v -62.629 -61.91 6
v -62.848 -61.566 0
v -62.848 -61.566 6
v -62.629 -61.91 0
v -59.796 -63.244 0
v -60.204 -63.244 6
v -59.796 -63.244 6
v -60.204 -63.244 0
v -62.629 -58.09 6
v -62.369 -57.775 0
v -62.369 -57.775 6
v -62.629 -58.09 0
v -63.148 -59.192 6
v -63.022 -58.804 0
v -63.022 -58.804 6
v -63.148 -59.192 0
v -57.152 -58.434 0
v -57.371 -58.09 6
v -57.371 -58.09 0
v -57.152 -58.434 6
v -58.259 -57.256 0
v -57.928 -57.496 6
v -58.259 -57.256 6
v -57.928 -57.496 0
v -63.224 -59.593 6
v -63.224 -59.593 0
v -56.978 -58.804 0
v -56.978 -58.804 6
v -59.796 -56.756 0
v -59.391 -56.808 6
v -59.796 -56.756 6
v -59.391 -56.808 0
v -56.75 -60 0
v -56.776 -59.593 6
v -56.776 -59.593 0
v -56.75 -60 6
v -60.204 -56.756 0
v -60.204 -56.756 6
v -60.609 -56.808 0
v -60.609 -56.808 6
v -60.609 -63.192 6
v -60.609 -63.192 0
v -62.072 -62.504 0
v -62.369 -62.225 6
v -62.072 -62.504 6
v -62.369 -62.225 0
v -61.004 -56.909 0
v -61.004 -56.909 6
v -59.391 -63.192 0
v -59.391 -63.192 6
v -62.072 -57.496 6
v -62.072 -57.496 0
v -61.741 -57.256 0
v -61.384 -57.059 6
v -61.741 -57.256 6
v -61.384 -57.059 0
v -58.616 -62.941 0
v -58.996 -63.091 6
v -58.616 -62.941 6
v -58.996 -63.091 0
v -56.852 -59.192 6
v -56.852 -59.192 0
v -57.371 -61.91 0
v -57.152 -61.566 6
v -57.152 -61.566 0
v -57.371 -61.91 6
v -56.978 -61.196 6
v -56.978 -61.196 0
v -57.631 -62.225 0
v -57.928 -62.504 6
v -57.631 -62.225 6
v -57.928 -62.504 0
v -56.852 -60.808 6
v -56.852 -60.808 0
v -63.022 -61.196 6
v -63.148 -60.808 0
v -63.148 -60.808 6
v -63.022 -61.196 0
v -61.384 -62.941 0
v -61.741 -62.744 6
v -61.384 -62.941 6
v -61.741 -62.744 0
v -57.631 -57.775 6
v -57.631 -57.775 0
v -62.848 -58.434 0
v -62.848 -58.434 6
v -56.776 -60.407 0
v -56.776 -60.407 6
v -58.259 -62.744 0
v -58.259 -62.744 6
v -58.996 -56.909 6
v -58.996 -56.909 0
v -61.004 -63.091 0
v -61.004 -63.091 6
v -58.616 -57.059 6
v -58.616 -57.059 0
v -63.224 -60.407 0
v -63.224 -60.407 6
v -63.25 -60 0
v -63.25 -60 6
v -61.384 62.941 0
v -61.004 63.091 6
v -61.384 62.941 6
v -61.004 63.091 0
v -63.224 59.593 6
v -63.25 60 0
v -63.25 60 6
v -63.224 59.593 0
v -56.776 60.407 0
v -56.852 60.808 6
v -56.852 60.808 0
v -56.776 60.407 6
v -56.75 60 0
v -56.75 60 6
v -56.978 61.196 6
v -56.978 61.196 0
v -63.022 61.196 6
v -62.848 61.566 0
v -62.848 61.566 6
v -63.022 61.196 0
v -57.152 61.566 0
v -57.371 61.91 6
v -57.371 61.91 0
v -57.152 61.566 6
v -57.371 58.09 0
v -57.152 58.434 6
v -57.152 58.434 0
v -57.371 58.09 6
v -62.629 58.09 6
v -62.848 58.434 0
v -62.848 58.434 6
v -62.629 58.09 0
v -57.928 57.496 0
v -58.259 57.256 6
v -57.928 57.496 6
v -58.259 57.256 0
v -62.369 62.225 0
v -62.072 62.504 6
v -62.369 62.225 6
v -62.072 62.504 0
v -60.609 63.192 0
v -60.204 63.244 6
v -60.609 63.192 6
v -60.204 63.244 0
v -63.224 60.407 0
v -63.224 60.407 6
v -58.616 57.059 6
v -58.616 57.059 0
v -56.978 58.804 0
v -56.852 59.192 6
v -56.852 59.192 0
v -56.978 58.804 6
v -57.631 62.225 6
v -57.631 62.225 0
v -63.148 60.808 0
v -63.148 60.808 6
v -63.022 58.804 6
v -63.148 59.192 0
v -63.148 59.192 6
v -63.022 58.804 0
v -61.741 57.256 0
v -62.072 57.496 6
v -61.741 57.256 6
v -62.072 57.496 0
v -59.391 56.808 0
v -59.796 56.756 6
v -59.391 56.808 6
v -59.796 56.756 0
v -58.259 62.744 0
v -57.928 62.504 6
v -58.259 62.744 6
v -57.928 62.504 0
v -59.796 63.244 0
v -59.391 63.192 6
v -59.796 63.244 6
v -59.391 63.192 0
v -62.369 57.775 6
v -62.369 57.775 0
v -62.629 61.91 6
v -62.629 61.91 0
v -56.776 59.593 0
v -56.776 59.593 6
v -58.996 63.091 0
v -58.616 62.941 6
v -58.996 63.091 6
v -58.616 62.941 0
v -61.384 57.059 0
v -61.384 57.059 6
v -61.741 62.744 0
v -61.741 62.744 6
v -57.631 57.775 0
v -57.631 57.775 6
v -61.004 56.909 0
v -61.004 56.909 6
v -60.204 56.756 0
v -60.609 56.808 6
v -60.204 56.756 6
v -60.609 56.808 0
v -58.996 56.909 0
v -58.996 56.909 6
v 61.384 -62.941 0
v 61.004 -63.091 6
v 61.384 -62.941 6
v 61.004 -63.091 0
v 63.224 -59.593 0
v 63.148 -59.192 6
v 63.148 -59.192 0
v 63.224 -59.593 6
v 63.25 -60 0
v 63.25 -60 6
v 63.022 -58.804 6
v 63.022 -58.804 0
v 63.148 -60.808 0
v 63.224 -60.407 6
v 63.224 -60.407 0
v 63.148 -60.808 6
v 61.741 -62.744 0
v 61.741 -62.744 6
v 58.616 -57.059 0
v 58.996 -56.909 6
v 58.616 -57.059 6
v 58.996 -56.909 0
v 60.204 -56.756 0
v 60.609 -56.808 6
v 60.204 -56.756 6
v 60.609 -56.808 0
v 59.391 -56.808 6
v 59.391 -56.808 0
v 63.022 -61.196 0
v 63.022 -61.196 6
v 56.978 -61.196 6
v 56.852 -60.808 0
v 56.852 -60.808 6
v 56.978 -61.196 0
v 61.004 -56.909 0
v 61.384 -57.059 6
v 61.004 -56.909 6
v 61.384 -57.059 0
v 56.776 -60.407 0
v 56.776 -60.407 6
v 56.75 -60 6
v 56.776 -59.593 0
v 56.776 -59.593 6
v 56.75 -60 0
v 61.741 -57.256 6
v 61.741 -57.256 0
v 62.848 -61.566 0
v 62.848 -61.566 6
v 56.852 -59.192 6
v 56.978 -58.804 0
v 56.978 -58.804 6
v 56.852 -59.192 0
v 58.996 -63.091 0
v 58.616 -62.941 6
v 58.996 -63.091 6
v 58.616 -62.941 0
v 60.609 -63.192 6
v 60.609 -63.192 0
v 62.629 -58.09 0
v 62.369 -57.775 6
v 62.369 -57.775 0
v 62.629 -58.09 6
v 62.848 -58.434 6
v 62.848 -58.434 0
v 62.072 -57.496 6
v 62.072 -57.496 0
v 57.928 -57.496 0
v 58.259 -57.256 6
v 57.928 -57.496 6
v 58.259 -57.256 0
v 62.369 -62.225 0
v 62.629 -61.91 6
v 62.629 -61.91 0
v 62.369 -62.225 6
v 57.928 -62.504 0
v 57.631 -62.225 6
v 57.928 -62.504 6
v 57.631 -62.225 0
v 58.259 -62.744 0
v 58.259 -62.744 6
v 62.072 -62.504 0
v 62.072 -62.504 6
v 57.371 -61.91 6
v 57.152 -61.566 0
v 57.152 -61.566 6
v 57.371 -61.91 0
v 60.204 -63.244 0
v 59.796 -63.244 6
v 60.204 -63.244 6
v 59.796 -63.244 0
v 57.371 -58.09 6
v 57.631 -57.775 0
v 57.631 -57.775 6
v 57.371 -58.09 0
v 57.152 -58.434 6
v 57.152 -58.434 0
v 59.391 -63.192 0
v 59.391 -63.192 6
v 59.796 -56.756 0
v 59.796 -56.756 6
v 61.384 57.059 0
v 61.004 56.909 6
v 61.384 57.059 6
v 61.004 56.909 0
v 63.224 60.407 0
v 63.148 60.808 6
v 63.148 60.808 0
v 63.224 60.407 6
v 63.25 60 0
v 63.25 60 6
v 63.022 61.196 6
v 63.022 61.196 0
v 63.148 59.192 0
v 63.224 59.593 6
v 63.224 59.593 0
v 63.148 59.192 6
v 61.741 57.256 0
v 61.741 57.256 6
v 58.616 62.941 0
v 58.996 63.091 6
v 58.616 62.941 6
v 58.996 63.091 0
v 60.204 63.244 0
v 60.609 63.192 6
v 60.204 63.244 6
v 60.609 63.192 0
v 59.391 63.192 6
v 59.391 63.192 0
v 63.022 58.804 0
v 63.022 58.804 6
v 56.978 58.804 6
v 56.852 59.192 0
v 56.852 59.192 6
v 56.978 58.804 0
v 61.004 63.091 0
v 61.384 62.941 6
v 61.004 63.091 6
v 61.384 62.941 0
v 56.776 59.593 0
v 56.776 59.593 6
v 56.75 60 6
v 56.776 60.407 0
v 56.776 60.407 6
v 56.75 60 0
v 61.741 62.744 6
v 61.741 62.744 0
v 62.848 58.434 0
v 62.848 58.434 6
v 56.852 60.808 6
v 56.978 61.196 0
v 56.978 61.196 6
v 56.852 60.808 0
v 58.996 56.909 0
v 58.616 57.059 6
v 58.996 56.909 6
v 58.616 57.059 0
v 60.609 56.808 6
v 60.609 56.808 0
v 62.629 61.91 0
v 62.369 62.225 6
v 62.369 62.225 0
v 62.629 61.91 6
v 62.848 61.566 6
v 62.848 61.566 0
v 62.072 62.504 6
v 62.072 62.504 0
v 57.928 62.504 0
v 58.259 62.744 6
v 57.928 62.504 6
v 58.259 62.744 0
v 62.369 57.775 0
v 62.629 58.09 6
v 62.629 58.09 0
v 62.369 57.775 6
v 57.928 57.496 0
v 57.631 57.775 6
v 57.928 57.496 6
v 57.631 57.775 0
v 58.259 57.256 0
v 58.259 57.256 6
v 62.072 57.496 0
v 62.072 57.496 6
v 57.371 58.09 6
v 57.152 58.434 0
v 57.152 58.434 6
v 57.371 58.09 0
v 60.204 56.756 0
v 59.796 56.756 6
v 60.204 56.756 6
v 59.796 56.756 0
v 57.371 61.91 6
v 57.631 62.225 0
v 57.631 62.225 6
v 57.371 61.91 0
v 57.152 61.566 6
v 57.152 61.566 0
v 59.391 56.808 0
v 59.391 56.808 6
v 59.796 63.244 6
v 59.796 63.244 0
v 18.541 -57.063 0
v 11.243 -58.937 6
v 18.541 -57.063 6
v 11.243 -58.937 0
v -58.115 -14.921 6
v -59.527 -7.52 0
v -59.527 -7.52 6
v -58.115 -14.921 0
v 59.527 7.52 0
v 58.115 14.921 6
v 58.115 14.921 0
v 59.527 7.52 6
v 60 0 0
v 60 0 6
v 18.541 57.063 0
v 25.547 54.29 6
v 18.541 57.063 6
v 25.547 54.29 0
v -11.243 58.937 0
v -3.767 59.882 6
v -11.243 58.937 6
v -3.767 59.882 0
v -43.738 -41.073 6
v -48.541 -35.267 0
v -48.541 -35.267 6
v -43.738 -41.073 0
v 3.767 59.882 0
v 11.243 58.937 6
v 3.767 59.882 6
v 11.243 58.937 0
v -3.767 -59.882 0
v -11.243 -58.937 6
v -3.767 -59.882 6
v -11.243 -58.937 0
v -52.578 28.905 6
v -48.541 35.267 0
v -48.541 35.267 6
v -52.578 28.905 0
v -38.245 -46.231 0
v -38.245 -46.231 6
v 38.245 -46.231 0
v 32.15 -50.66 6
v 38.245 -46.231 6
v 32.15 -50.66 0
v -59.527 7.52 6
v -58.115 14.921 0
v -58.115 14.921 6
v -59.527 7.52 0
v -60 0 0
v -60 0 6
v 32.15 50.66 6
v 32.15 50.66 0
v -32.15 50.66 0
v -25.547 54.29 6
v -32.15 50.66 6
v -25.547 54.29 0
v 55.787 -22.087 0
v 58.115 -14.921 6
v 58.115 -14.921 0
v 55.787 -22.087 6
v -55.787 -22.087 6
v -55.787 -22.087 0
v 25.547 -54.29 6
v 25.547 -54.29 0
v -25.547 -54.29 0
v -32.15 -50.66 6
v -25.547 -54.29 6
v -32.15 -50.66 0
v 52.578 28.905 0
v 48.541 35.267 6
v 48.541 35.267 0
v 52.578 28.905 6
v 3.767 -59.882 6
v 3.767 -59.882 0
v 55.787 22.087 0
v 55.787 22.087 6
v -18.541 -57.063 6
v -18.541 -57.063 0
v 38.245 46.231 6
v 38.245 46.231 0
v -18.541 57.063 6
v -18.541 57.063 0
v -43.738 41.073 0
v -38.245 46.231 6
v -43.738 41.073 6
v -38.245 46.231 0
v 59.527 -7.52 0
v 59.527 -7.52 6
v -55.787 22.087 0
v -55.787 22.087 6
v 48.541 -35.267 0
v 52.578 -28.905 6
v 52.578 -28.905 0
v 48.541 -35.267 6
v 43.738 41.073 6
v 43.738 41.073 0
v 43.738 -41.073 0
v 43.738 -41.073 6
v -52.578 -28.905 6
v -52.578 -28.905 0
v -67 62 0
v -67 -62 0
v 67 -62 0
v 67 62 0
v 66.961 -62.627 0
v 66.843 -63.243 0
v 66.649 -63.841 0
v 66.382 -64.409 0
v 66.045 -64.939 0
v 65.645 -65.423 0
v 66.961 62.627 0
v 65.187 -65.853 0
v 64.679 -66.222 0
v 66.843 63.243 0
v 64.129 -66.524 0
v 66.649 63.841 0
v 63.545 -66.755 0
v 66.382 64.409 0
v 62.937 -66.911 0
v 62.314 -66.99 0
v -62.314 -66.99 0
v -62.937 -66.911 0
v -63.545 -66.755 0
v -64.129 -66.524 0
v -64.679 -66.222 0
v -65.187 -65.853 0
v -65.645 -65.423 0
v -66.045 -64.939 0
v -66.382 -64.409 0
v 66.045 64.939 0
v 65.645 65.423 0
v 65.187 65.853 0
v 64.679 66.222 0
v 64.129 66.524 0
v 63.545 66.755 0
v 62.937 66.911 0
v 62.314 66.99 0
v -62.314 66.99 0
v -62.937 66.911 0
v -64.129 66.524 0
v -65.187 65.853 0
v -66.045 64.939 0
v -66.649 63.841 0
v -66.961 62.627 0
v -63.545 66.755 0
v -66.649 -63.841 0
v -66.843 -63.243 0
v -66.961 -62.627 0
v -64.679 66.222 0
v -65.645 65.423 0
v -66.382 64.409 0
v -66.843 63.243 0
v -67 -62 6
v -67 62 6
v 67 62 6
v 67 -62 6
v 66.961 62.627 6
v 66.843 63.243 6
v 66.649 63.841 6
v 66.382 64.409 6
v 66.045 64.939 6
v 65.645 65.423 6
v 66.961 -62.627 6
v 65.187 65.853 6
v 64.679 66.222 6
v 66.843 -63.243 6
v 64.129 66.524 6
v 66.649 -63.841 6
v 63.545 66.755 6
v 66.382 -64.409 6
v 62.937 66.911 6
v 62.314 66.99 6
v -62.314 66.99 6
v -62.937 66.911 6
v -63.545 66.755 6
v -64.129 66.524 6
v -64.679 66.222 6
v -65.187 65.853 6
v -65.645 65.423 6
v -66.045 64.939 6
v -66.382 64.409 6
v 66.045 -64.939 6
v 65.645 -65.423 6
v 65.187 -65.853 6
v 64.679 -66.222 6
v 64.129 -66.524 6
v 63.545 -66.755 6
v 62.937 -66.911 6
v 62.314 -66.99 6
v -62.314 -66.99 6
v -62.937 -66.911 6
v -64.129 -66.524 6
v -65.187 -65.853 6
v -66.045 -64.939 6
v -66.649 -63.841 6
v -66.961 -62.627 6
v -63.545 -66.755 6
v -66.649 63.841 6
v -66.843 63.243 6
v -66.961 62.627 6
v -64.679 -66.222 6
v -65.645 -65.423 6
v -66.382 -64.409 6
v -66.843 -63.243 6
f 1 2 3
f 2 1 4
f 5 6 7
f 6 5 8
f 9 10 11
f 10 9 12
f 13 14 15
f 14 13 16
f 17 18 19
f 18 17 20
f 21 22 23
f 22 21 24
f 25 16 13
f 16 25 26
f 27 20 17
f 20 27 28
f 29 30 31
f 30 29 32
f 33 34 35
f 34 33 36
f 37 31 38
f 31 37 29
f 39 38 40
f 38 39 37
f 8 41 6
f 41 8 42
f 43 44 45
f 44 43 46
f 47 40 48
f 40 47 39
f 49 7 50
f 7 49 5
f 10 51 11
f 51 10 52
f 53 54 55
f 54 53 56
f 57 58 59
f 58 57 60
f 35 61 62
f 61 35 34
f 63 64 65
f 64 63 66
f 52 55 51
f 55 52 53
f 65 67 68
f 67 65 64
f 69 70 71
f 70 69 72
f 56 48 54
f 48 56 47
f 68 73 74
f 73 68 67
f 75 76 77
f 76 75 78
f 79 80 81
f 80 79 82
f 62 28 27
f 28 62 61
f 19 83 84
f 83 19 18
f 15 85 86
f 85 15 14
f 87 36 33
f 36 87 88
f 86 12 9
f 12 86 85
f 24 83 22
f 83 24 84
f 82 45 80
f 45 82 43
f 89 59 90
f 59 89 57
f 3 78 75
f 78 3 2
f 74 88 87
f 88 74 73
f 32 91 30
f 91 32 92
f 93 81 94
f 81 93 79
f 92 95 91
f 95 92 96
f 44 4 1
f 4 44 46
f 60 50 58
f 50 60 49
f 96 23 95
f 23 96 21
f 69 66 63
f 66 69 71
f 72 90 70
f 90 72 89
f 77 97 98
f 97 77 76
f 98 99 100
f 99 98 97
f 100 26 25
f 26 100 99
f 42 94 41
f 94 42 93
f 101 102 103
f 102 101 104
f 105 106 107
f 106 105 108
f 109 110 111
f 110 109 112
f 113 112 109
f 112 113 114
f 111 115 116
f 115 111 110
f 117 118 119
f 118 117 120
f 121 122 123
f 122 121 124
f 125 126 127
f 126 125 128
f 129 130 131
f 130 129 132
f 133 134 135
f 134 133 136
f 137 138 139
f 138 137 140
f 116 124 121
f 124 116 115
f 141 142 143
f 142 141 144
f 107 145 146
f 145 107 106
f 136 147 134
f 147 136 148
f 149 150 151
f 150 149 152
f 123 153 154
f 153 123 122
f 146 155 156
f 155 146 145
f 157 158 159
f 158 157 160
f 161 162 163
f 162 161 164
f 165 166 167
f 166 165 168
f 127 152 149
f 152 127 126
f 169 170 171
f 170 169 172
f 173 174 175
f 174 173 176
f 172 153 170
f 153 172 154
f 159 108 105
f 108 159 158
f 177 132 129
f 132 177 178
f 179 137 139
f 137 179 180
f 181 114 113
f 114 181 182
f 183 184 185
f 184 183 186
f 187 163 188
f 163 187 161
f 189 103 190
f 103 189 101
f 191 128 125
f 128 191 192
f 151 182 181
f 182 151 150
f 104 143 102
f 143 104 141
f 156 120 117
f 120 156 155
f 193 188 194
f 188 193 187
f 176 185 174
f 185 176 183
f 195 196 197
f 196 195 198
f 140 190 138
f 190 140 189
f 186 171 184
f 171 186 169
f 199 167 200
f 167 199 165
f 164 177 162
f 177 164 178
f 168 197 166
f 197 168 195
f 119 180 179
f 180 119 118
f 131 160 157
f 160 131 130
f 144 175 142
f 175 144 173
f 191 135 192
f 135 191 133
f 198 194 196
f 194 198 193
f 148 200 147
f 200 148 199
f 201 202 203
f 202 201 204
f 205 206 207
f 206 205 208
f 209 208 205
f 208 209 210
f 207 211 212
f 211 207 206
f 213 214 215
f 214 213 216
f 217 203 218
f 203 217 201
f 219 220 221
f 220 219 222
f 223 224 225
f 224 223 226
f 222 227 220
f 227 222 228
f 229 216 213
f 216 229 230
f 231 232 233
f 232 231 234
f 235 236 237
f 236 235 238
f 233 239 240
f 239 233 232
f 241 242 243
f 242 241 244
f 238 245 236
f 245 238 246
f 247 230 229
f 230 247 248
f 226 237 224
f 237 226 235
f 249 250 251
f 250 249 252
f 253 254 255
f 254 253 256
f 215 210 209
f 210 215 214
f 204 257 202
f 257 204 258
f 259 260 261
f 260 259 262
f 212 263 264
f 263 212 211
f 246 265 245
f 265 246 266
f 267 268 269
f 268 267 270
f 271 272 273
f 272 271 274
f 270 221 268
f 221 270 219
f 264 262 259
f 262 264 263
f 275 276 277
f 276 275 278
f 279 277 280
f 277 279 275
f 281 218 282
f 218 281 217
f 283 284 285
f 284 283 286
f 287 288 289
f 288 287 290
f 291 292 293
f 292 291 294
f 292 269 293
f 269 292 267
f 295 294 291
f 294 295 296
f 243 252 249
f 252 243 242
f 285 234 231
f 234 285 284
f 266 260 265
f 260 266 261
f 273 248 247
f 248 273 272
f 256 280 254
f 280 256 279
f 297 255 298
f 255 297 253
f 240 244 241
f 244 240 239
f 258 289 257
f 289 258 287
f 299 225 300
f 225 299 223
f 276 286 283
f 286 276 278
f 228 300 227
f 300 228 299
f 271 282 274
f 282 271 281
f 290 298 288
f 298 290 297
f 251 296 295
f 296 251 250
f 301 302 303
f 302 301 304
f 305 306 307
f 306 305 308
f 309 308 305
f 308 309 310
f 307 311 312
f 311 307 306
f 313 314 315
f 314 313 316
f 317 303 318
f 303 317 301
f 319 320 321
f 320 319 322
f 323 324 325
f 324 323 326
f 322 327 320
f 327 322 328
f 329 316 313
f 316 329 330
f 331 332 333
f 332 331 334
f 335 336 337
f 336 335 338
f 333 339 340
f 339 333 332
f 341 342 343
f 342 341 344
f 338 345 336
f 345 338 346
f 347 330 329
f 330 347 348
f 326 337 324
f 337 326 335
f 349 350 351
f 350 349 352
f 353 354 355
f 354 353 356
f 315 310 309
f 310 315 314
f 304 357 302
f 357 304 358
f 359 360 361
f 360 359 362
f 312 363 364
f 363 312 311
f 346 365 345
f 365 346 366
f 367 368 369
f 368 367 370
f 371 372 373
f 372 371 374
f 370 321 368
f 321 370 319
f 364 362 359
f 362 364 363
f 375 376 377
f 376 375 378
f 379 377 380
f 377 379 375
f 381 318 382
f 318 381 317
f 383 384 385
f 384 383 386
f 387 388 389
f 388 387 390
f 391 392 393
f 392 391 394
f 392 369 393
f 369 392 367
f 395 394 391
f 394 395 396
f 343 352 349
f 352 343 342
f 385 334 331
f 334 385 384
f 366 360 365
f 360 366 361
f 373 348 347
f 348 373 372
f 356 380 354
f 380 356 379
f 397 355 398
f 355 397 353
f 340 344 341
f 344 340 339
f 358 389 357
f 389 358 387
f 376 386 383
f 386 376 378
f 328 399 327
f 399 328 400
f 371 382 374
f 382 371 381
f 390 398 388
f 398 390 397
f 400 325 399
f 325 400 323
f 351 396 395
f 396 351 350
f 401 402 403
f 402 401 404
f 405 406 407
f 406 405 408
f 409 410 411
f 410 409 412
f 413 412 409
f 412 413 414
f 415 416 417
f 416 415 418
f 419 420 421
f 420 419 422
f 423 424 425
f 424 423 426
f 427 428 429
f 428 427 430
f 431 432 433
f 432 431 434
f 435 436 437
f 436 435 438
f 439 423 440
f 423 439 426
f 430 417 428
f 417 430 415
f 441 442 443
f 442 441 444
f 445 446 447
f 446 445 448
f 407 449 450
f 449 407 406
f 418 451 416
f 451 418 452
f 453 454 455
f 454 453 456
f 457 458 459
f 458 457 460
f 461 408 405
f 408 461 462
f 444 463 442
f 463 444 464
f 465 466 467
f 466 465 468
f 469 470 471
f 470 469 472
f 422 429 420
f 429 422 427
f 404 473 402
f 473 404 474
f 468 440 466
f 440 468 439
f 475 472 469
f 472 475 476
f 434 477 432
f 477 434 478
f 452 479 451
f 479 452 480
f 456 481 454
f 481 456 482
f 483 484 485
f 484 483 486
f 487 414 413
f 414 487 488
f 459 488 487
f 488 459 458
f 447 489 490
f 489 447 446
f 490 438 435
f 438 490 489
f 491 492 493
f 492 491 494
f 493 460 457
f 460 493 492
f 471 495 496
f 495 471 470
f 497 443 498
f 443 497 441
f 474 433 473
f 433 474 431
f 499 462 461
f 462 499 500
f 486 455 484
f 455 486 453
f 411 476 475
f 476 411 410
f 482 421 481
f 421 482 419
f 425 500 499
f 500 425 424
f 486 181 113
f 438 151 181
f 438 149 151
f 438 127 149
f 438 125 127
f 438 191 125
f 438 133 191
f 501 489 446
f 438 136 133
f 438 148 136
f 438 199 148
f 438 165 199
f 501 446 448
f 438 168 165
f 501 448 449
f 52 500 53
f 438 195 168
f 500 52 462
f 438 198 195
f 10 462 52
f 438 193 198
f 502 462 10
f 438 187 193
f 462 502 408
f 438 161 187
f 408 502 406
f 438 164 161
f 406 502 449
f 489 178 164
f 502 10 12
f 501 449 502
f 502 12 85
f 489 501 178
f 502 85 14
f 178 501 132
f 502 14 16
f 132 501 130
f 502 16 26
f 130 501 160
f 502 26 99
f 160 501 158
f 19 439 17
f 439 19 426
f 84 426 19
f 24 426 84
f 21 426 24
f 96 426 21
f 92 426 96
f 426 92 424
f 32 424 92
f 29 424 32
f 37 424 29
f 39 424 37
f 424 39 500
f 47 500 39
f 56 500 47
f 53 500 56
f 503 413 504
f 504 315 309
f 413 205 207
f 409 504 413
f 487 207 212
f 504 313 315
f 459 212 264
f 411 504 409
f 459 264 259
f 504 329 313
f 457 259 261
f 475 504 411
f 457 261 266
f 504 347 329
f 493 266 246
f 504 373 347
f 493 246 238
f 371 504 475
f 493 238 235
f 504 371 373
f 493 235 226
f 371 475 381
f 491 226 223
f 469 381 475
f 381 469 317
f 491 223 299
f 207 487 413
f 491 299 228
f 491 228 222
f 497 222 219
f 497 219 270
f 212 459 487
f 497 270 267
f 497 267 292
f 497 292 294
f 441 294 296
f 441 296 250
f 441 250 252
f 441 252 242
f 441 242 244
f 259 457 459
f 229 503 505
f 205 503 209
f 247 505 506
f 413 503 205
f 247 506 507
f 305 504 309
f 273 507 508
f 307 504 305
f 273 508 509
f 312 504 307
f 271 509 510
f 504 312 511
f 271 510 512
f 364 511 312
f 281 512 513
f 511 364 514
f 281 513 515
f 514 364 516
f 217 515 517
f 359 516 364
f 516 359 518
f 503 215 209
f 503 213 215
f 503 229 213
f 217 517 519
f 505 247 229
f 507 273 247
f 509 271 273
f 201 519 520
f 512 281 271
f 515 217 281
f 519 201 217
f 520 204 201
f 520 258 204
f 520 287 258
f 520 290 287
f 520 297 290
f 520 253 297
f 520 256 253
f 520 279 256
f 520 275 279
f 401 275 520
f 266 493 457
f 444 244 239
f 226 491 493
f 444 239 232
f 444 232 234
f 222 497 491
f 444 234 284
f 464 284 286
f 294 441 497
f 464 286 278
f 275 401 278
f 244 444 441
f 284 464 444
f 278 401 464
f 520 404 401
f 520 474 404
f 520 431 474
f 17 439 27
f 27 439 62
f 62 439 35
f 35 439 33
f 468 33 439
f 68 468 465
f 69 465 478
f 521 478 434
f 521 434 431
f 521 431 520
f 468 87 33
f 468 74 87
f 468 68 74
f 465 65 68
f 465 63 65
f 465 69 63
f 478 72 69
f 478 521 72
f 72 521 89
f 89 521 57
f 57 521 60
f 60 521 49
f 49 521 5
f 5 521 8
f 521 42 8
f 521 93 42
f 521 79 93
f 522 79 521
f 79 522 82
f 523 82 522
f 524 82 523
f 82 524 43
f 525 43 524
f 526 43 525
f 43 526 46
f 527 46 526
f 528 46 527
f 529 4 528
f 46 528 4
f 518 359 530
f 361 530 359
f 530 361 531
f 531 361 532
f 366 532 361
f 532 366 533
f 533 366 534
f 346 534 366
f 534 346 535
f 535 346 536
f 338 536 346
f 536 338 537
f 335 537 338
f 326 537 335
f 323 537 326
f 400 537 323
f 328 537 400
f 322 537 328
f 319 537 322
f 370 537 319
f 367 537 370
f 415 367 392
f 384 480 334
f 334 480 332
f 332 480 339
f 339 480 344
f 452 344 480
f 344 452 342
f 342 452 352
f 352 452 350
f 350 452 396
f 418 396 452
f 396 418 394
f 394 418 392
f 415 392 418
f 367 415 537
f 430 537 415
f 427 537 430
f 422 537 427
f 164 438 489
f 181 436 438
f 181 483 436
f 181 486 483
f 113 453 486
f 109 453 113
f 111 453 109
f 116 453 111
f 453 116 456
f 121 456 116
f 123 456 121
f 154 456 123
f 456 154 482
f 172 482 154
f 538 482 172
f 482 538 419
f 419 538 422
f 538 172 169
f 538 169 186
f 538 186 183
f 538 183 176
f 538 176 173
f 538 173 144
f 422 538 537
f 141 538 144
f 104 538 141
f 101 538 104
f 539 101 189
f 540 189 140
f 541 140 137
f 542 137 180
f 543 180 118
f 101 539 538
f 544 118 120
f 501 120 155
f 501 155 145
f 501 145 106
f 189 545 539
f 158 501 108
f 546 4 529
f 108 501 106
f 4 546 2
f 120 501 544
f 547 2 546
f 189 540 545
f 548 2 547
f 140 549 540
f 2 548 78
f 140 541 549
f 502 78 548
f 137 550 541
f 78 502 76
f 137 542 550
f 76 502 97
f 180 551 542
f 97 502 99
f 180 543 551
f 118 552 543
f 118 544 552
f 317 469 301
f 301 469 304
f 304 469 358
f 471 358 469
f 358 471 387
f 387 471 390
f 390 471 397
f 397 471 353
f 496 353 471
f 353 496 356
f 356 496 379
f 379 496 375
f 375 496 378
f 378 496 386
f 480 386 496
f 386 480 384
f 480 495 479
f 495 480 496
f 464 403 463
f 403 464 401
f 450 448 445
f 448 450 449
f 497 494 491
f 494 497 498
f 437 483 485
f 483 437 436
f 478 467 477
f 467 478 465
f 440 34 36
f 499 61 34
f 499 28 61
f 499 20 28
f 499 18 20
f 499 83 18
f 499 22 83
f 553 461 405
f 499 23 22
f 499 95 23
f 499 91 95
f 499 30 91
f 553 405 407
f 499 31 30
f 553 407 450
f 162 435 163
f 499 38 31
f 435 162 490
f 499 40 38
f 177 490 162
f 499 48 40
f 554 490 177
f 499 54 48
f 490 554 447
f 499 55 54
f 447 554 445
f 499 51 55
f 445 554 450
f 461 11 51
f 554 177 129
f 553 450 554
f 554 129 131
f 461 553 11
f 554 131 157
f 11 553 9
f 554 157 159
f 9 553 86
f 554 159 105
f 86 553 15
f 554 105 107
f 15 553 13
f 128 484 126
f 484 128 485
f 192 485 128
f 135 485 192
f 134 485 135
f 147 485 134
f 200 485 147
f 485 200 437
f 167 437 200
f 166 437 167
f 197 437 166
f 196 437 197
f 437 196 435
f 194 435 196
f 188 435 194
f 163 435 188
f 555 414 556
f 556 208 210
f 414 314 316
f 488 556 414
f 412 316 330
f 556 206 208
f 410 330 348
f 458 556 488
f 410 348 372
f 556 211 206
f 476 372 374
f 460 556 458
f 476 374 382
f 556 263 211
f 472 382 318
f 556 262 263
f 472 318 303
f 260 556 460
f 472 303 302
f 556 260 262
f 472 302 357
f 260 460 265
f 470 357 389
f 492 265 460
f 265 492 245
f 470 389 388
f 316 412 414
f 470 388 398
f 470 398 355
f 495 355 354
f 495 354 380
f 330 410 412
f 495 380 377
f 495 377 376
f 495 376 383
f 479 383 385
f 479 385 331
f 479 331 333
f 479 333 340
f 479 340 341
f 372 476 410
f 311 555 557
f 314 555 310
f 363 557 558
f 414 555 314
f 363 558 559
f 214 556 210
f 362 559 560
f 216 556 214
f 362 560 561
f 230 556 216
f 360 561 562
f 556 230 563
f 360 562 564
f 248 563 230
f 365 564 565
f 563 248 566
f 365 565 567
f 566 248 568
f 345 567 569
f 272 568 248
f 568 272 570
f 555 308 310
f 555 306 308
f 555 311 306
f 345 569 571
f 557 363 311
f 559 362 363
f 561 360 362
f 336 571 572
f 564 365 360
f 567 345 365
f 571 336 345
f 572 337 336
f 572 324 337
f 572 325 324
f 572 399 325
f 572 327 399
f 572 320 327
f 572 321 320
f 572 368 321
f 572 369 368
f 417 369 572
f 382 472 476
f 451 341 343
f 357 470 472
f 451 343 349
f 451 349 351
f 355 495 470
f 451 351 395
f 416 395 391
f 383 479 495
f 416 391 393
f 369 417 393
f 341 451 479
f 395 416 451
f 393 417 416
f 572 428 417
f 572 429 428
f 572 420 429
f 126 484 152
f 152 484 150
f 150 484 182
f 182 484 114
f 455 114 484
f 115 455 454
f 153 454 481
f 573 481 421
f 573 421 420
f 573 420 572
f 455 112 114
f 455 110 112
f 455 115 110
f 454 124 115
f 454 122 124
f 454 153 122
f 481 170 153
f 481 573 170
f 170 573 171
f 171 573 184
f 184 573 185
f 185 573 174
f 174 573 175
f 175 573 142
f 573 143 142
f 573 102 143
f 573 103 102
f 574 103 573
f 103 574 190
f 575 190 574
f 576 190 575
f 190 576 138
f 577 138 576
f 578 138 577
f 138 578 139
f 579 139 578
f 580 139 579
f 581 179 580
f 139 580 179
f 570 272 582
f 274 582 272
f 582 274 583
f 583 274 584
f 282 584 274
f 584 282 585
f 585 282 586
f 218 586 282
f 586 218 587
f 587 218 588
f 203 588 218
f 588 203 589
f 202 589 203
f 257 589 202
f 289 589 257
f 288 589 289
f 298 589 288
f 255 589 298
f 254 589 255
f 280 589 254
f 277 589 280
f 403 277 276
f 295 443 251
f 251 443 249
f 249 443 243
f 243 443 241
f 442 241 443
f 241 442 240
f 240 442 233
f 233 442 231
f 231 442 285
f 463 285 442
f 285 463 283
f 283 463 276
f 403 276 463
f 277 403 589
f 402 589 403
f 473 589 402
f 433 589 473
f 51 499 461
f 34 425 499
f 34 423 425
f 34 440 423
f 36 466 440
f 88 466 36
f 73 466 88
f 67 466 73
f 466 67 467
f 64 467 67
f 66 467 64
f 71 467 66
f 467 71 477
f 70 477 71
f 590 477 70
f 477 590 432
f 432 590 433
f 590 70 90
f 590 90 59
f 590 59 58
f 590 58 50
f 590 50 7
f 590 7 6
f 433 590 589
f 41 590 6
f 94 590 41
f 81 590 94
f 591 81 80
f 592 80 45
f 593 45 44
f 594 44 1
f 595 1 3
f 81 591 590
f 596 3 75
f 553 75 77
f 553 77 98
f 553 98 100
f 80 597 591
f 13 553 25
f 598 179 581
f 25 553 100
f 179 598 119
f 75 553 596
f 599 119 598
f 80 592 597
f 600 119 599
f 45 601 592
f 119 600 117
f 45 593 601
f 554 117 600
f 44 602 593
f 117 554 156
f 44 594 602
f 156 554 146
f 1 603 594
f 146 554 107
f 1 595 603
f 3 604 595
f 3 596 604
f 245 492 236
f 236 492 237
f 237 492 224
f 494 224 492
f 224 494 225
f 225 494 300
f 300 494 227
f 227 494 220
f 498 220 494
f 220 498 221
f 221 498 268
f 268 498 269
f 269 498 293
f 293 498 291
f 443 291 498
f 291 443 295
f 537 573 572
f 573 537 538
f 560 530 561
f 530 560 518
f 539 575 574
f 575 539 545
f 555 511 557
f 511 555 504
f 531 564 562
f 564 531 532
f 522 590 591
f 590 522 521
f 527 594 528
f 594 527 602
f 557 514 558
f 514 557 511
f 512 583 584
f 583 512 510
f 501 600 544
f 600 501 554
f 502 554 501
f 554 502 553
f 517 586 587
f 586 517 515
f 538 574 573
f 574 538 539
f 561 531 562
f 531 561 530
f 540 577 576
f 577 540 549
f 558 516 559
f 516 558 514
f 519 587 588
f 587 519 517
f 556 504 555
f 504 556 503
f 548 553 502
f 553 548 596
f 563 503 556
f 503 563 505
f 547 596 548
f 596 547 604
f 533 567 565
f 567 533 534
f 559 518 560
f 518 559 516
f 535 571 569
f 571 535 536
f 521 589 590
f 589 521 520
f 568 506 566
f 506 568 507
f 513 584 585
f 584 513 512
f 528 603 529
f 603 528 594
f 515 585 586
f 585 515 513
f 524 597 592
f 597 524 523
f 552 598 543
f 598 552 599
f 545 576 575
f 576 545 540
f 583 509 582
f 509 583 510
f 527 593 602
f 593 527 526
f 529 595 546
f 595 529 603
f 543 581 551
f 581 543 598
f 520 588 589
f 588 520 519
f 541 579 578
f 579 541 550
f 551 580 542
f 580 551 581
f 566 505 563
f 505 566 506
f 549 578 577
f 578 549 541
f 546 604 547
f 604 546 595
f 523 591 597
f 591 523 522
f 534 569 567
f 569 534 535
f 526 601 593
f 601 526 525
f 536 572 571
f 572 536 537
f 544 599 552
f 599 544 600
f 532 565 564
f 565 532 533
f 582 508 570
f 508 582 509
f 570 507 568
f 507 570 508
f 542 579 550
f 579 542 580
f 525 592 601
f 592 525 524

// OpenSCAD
$fn = 50;


difference() {
	union() {
		hull() {
			translate(v = [-62.0000000000, 62.0000000000, 0]) {
				cylinder(h = 6, r = 5);
			}
			translate(v = [62.0000000000, 62.0000000000, 0]) {
				cylinder(h = 6, r = 5);
			}
			translate(v = [-62.0000000000, -62.0000000000, 0]) {
				cylinder(h = 6, r = 5);
			}
			translate(v = [62.0000000000, -62.0000000000, 0]) {
				cylinder(h = 6, r = 5);
			}
		}
	}
	union() {
		#translate(v = [-60.0000000000, -60.0000000000, -100.0000000000]) {
			cylinder(h = 200, r = 3.2500000000);
		}
		#translate(v = [-60.0000000000, 60.0000000000, -100.0000000000]) {
			cylinder(h = 200, r = 3.2500000000);
		}
		#translate(v = [60.0000000000, -60.0000000000, -100.0000000000]) {
			cylinder(h = 200, r = 3.2500000000);
		}
		#translate(v = [60.0000000000, 60.0000000000, -100.0000000000]) {
			cylinder(h = 200, r = 3.2500000000);
		}
		#cylinder(h = 6, r = 60.0000000000);
	}
}
